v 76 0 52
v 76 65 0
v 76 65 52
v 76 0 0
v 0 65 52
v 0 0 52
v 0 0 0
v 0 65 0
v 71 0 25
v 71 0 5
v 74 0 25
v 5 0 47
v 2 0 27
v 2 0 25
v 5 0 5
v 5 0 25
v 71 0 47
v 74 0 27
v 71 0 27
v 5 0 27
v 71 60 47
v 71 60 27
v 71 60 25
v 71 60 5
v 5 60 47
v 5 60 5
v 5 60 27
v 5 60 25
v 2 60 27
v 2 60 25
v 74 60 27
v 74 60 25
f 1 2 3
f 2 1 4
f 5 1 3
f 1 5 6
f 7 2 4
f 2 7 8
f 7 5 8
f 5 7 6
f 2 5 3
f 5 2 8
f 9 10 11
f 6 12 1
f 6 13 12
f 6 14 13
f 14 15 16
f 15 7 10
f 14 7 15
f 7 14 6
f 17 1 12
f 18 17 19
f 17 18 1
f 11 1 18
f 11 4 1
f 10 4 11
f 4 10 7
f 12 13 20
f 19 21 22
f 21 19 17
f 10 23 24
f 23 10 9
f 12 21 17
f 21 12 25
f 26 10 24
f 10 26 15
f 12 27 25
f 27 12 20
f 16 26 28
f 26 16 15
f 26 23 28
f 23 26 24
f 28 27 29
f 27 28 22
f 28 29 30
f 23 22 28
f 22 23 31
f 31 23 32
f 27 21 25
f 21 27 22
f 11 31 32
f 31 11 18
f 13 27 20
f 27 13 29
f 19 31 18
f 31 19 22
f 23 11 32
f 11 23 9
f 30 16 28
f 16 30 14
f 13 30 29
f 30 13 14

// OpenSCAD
bHeight = 2;
bWidth = 72;
bLength = 50;
padding = 5;
lip =3;
difference(){
  cube([76, 65, 52]);
  translate([5, -1, 5]){
    cube([66,61,42]);
  }
  translate([2,-1,25]){
    cube([bWidth, 61, bHeight]);
  }
}
